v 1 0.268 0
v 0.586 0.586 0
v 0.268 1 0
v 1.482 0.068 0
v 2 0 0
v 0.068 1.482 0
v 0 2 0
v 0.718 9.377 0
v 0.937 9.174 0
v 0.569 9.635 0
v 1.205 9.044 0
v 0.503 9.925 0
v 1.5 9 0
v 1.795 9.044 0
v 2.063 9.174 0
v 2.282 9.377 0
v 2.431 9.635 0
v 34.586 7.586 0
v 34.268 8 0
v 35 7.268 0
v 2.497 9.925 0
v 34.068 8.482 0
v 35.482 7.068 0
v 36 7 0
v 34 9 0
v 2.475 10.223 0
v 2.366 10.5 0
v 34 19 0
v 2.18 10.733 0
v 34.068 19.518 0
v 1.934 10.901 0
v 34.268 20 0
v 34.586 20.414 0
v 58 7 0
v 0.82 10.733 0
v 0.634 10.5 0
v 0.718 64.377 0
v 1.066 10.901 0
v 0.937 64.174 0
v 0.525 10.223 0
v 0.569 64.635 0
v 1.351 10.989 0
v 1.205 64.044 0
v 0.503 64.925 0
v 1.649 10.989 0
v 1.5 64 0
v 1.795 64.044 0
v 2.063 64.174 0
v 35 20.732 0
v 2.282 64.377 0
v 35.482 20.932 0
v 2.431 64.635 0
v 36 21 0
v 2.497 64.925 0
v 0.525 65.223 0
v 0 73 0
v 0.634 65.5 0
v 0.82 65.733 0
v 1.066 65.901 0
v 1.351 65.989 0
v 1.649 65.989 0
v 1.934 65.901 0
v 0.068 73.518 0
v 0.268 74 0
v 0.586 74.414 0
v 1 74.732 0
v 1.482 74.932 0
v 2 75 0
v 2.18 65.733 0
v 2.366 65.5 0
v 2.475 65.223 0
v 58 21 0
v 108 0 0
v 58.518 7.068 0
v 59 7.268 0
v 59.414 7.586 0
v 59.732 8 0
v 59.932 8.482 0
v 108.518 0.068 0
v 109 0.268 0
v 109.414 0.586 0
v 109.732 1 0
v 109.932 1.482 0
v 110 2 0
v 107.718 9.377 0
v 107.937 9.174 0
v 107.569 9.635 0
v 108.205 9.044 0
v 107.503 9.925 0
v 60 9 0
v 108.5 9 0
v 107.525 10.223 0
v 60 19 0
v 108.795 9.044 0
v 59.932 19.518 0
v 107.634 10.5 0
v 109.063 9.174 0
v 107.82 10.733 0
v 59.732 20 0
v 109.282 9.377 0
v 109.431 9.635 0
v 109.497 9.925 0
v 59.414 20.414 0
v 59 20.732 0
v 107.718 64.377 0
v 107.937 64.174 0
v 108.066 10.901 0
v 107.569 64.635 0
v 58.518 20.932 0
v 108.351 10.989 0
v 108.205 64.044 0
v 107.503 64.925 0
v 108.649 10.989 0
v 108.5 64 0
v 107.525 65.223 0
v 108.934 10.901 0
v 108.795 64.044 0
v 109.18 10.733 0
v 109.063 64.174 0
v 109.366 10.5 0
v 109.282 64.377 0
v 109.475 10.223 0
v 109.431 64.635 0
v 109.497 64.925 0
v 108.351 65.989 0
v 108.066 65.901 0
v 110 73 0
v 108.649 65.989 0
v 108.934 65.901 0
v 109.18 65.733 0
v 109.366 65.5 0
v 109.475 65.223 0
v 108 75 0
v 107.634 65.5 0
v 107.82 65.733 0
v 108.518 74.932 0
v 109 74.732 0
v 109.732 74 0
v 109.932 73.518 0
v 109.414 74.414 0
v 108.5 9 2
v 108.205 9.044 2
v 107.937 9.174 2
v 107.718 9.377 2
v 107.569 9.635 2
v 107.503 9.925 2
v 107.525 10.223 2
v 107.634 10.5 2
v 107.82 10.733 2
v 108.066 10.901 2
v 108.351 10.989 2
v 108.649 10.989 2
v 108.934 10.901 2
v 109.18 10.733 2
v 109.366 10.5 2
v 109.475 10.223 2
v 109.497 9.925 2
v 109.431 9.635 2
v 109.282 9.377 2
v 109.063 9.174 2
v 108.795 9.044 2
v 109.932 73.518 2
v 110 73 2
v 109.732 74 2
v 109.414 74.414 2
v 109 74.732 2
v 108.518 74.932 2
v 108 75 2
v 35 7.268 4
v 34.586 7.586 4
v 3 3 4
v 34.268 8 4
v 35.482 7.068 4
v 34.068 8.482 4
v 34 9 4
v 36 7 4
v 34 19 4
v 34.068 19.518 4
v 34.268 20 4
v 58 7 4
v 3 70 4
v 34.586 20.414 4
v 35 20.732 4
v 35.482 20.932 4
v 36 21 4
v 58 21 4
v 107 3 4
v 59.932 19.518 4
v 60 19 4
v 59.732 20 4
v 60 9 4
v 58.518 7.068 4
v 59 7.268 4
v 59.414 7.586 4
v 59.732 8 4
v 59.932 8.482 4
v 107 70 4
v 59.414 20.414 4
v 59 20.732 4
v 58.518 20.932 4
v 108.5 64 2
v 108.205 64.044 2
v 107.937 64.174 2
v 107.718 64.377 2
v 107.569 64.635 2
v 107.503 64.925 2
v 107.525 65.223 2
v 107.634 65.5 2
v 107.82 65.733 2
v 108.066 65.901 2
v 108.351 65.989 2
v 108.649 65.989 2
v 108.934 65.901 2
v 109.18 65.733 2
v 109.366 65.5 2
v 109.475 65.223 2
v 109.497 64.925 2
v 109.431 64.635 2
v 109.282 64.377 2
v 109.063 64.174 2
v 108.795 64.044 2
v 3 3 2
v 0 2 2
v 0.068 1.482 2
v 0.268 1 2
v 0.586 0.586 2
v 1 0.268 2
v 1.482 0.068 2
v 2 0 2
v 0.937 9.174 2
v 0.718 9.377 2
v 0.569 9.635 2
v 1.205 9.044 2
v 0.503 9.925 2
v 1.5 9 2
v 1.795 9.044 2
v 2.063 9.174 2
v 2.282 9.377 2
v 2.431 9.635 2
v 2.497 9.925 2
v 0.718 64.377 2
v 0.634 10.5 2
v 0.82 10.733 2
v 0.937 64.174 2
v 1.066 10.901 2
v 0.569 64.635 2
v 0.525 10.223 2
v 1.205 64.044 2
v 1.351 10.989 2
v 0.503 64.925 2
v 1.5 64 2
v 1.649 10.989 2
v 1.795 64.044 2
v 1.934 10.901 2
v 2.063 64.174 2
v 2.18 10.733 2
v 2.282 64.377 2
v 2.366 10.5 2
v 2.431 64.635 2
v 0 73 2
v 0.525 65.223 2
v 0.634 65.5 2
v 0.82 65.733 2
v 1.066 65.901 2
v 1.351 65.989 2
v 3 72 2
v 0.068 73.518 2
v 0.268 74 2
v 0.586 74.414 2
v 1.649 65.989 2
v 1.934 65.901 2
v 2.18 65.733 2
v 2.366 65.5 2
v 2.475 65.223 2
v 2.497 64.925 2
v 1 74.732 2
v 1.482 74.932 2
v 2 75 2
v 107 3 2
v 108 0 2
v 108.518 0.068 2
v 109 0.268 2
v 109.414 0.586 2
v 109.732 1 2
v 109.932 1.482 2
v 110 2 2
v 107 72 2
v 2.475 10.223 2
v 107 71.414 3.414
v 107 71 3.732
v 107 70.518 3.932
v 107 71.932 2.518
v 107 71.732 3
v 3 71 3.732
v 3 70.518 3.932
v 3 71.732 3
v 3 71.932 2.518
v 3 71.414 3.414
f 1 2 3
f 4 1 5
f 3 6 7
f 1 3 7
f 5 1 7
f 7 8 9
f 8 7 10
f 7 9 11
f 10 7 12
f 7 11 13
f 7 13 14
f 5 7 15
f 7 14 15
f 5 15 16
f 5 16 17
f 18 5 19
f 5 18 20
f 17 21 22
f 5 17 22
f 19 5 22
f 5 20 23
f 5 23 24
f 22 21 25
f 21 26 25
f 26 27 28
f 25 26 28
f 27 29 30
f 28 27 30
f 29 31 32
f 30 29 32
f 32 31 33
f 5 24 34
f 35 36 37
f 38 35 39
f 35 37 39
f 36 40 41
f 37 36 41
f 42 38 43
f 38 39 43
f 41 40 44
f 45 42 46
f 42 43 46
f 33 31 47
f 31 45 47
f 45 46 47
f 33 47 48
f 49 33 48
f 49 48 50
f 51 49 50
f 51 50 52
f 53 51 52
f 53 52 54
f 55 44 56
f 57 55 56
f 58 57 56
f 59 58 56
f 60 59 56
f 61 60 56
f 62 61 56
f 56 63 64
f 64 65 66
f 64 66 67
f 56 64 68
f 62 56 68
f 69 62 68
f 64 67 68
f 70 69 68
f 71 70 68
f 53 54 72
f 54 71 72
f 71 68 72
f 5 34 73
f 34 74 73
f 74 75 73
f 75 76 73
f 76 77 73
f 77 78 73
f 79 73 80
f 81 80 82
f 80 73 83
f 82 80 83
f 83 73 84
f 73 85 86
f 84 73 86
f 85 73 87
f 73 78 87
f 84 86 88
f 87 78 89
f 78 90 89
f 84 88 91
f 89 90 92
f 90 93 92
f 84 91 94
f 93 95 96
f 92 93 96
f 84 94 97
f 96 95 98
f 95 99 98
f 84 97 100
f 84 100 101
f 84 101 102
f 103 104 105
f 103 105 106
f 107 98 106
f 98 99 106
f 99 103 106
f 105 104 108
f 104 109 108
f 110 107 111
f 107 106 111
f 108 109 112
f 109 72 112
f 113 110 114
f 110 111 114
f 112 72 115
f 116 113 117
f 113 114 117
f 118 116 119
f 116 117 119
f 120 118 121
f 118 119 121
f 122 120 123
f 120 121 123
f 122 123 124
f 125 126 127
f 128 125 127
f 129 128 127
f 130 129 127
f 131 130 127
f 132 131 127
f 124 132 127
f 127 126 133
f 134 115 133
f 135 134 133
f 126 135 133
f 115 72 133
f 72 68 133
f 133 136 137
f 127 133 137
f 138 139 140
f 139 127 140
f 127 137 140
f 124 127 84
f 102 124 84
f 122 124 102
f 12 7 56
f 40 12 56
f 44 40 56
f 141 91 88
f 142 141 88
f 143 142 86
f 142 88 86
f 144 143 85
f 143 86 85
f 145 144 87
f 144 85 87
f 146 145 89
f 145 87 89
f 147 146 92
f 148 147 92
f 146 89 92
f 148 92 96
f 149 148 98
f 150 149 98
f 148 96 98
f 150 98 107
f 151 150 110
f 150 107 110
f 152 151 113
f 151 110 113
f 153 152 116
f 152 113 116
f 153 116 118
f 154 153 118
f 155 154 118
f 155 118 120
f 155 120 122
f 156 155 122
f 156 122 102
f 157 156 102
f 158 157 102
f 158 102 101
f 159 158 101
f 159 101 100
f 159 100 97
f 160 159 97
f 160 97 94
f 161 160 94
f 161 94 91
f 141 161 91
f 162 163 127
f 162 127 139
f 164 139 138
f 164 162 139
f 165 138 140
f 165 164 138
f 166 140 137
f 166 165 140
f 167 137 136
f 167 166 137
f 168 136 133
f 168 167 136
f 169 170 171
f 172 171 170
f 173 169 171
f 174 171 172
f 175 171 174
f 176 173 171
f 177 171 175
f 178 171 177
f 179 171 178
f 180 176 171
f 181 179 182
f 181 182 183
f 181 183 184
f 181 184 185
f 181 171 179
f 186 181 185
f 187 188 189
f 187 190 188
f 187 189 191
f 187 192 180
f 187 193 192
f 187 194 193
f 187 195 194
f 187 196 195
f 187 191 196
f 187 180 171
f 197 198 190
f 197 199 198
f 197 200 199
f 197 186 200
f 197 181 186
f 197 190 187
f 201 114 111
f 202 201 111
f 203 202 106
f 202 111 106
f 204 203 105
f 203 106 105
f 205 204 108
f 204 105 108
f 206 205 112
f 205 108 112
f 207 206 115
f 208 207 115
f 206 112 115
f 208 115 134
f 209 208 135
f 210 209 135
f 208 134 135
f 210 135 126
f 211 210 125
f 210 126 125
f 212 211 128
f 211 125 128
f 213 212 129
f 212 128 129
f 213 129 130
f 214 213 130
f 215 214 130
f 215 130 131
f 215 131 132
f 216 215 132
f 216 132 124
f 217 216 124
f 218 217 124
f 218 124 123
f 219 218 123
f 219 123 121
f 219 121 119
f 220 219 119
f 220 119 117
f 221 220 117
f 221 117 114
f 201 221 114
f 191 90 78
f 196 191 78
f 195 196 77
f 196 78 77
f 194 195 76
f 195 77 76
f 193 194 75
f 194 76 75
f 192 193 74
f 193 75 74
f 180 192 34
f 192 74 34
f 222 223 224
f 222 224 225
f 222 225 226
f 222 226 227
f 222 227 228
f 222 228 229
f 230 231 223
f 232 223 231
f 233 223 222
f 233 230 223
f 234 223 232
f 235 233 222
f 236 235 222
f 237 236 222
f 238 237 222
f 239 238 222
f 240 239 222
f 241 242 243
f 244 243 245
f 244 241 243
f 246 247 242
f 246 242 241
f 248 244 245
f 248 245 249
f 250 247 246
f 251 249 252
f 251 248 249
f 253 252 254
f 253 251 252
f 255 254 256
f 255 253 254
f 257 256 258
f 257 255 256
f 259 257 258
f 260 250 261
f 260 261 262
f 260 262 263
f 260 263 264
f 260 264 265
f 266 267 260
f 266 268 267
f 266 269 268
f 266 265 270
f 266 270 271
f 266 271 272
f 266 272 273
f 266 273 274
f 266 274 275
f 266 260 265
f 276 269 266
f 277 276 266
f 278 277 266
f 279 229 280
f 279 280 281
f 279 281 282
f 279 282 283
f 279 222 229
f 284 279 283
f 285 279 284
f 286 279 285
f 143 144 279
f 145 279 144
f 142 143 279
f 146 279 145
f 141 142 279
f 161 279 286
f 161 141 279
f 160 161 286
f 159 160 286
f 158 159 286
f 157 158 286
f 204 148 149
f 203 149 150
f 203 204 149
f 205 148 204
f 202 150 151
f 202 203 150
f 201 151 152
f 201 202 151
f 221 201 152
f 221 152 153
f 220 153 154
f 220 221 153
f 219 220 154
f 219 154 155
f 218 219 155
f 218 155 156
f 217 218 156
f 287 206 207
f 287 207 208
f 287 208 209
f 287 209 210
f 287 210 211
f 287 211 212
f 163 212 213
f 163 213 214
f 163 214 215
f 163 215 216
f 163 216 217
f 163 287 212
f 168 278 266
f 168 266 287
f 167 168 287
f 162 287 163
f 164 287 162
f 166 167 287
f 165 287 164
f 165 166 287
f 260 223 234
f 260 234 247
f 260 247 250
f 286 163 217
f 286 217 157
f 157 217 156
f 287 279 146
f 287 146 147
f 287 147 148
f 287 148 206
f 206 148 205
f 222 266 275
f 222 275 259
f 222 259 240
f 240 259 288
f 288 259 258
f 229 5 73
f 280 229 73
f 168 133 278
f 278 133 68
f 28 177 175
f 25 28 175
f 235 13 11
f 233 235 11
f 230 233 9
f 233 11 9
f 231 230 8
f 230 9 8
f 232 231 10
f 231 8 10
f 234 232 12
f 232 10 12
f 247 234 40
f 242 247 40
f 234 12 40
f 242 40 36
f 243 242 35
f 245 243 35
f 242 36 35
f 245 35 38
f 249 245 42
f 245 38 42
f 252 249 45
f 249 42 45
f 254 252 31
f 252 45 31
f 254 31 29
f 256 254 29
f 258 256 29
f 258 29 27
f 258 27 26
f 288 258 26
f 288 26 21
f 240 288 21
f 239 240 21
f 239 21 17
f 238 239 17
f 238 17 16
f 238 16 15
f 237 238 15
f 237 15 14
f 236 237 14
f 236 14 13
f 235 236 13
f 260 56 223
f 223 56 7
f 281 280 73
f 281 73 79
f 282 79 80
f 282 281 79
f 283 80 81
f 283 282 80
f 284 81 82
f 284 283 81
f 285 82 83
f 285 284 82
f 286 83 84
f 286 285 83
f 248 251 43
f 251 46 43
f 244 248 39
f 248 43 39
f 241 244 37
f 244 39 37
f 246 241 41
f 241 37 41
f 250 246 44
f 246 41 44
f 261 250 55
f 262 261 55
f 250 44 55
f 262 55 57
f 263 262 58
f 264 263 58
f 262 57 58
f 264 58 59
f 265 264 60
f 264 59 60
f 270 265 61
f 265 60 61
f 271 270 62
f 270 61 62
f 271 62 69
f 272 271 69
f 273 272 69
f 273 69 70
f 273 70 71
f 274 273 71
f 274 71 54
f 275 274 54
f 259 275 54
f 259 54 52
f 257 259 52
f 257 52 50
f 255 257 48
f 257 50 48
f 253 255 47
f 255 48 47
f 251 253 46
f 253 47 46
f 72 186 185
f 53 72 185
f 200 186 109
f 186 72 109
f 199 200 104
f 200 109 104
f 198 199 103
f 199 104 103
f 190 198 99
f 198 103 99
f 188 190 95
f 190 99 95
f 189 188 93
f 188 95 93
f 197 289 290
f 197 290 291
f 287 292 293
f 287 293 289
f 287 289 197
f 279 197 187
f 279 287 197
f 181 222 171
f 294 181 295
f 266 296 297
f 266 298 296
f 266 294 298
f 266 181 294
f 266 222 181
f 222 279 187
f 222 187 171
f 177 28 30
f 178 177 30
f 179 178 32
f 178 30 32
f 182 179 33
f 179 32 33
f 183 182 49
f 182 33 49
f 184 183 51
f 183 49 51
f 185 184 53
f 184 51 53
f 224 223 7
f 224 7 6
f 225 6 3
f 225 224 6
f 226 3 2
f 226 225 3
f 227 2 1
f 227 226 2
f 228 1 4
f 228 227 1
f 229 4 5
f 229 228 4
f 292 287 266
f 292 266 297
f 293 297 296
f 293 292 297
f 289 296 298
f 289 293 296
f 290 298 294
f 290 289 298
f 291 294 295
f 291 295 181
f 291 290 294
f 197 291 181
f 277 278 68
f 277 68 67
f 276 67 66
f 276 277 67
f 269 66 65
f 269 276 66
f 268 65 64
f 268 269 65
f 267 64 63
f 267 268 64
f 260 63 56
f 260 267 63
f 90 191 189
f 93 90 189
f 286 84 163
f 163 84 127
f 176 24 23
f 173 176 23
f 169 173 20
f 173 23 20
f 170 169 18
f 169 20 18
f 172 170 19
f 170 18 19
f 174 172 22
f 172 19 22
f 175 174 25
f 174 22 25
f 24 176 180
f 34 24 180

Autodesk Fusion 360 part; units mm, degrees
sketch "Sketch1" plane through (0, 0, 0) normal (0, 0, 1) x (1, 0, 0)
  line L0 (0, 0) -> (110, 0)
  line L1 (110, 0) -> (110, 75)
  line L2 (110, 75) -> (0, 75)
  line L3 (0, 75) -> (0, 0)
  dimension "d1" = 110
  dimension "d2" = 75
extrude "Extrude1" add sketch "Sketch1" along normal blind 2
sketch "Screws" plane through (0, 0, 2) normal (0, 0, 1) x (1, 0, 0)
  line L0 (107, 72) -> (107, 3)
  line L1 (3, 3) -> (3, 72)
  line L2 (3, 72) -> (107, 72)
  line L3 (107, 3) -> (3, 3)
  line L4 (110, 75) -> (0, 75)
  line L5 (0, 0) -> (110, 0)
  line L6 (110, 0) -> (110, 75)
  line L7 (0, 75) -> (0, 0)
  line L8 (1.5, 65) -> (1.5, 10)
  line L9 (108.5, 65) -> (1.5, 65)
  line L10 (1.5, 10) -> (108.5, 10)
  line L11 (108.5, 10) -> (108.5, 65)
  dimension "d10" = 107
  dimension "d12" = 10
  dimension "d13" = 65
hole "Hole1" at (1.5, 10, 2) at (1.5, 65, 2) at (108.5, 65, 2) at (108.5, 10, 2) direction (0, 0, -1) diameter 2 depth 19 tip angle 180
sketch "screw holes" plane through (0, 0, 2) normal (0, 0, 1) x (1, 0, 0)
  line L0 (3, 3) -> (3, 72)
  line L1 (3, 72) -> (107, 72)
  line L2 (107, 72) -> (107, 3)
  line L3 (107, 3) -> (3, 3)
  line L4 (110, 75) -> (0, 75)
  line L5 (0, 0) -> (110, 0)
  line L6 (110, 0) -> (110, 75)
  line L7 (0, 75) -> (0, 0)
  line L8 (1.5, 15) -> (108.5, 15)
  line L9 (108.5, 15) -> (108.5, 65)
  line L10 (1.5, 65) -> (1.5, 15)
  line L11 (108.5, 65) -> (1.5, 65)
extrude "Extrude2" add sketch "screw holes" along normal blind 2 contours L0 L2 L3 L8 | L0 L2 L8 L11 | L0 L1 L2 L11
sketch "Sketch4" plane through (0, 0, 4) normal (0, 0, 1) x (-1, 0, 0)
  line L0 (-107, -3) -> (-107, -72)
  line L1 (-107, -72) -> (-3, -72)
  line L2 (-3, -72) -> (-3, -3)
  line L3 (-3, -3) -> (-107, -3)
  line L4 (-34, -7) -> (-60, -7)
  line L5 (-60, -7) -> (-60, -21)
  line L6 (-60, -21) -> (-34, -21)
  line L7 (-34, -21) -> (-34, -7)
  point P0 (-34, -7)
  dimension "d14" = 7
  dimension "d15" = 34
  dimension "d16" = 60
  dimension "d17" = 21
extrude "Extrude3" cut sketch "Sketch4" against normal blind 5 contours L4 L5 L6 L7
fillet "Fillet1" radius 2 1 edges at (55, 72, 4)
fillet "Fillet1" radius 2 1 edges at (110, 75, 1)
fillet "Fillet1" radius 2 1 edges at (110, 0, 1)
fillet "Fillet1" radius 2 1 edges at (0, 0, 1)
fillet "Fillet1" radius 2 1 edges at (0, 75, 1)
fillet "Fillet1" radius 2 1 edges at (60, 21, 2)
fillet "Fillet1" radius 2 1 edges at (60, 7, 2)
fillet "Fillet1" radius 2 1 edges at (34, 7, 2)
fillet "Fillet1" radius 2 1 edges at (34, 21, 2)
equation "d13 = 75 mm - d12"
